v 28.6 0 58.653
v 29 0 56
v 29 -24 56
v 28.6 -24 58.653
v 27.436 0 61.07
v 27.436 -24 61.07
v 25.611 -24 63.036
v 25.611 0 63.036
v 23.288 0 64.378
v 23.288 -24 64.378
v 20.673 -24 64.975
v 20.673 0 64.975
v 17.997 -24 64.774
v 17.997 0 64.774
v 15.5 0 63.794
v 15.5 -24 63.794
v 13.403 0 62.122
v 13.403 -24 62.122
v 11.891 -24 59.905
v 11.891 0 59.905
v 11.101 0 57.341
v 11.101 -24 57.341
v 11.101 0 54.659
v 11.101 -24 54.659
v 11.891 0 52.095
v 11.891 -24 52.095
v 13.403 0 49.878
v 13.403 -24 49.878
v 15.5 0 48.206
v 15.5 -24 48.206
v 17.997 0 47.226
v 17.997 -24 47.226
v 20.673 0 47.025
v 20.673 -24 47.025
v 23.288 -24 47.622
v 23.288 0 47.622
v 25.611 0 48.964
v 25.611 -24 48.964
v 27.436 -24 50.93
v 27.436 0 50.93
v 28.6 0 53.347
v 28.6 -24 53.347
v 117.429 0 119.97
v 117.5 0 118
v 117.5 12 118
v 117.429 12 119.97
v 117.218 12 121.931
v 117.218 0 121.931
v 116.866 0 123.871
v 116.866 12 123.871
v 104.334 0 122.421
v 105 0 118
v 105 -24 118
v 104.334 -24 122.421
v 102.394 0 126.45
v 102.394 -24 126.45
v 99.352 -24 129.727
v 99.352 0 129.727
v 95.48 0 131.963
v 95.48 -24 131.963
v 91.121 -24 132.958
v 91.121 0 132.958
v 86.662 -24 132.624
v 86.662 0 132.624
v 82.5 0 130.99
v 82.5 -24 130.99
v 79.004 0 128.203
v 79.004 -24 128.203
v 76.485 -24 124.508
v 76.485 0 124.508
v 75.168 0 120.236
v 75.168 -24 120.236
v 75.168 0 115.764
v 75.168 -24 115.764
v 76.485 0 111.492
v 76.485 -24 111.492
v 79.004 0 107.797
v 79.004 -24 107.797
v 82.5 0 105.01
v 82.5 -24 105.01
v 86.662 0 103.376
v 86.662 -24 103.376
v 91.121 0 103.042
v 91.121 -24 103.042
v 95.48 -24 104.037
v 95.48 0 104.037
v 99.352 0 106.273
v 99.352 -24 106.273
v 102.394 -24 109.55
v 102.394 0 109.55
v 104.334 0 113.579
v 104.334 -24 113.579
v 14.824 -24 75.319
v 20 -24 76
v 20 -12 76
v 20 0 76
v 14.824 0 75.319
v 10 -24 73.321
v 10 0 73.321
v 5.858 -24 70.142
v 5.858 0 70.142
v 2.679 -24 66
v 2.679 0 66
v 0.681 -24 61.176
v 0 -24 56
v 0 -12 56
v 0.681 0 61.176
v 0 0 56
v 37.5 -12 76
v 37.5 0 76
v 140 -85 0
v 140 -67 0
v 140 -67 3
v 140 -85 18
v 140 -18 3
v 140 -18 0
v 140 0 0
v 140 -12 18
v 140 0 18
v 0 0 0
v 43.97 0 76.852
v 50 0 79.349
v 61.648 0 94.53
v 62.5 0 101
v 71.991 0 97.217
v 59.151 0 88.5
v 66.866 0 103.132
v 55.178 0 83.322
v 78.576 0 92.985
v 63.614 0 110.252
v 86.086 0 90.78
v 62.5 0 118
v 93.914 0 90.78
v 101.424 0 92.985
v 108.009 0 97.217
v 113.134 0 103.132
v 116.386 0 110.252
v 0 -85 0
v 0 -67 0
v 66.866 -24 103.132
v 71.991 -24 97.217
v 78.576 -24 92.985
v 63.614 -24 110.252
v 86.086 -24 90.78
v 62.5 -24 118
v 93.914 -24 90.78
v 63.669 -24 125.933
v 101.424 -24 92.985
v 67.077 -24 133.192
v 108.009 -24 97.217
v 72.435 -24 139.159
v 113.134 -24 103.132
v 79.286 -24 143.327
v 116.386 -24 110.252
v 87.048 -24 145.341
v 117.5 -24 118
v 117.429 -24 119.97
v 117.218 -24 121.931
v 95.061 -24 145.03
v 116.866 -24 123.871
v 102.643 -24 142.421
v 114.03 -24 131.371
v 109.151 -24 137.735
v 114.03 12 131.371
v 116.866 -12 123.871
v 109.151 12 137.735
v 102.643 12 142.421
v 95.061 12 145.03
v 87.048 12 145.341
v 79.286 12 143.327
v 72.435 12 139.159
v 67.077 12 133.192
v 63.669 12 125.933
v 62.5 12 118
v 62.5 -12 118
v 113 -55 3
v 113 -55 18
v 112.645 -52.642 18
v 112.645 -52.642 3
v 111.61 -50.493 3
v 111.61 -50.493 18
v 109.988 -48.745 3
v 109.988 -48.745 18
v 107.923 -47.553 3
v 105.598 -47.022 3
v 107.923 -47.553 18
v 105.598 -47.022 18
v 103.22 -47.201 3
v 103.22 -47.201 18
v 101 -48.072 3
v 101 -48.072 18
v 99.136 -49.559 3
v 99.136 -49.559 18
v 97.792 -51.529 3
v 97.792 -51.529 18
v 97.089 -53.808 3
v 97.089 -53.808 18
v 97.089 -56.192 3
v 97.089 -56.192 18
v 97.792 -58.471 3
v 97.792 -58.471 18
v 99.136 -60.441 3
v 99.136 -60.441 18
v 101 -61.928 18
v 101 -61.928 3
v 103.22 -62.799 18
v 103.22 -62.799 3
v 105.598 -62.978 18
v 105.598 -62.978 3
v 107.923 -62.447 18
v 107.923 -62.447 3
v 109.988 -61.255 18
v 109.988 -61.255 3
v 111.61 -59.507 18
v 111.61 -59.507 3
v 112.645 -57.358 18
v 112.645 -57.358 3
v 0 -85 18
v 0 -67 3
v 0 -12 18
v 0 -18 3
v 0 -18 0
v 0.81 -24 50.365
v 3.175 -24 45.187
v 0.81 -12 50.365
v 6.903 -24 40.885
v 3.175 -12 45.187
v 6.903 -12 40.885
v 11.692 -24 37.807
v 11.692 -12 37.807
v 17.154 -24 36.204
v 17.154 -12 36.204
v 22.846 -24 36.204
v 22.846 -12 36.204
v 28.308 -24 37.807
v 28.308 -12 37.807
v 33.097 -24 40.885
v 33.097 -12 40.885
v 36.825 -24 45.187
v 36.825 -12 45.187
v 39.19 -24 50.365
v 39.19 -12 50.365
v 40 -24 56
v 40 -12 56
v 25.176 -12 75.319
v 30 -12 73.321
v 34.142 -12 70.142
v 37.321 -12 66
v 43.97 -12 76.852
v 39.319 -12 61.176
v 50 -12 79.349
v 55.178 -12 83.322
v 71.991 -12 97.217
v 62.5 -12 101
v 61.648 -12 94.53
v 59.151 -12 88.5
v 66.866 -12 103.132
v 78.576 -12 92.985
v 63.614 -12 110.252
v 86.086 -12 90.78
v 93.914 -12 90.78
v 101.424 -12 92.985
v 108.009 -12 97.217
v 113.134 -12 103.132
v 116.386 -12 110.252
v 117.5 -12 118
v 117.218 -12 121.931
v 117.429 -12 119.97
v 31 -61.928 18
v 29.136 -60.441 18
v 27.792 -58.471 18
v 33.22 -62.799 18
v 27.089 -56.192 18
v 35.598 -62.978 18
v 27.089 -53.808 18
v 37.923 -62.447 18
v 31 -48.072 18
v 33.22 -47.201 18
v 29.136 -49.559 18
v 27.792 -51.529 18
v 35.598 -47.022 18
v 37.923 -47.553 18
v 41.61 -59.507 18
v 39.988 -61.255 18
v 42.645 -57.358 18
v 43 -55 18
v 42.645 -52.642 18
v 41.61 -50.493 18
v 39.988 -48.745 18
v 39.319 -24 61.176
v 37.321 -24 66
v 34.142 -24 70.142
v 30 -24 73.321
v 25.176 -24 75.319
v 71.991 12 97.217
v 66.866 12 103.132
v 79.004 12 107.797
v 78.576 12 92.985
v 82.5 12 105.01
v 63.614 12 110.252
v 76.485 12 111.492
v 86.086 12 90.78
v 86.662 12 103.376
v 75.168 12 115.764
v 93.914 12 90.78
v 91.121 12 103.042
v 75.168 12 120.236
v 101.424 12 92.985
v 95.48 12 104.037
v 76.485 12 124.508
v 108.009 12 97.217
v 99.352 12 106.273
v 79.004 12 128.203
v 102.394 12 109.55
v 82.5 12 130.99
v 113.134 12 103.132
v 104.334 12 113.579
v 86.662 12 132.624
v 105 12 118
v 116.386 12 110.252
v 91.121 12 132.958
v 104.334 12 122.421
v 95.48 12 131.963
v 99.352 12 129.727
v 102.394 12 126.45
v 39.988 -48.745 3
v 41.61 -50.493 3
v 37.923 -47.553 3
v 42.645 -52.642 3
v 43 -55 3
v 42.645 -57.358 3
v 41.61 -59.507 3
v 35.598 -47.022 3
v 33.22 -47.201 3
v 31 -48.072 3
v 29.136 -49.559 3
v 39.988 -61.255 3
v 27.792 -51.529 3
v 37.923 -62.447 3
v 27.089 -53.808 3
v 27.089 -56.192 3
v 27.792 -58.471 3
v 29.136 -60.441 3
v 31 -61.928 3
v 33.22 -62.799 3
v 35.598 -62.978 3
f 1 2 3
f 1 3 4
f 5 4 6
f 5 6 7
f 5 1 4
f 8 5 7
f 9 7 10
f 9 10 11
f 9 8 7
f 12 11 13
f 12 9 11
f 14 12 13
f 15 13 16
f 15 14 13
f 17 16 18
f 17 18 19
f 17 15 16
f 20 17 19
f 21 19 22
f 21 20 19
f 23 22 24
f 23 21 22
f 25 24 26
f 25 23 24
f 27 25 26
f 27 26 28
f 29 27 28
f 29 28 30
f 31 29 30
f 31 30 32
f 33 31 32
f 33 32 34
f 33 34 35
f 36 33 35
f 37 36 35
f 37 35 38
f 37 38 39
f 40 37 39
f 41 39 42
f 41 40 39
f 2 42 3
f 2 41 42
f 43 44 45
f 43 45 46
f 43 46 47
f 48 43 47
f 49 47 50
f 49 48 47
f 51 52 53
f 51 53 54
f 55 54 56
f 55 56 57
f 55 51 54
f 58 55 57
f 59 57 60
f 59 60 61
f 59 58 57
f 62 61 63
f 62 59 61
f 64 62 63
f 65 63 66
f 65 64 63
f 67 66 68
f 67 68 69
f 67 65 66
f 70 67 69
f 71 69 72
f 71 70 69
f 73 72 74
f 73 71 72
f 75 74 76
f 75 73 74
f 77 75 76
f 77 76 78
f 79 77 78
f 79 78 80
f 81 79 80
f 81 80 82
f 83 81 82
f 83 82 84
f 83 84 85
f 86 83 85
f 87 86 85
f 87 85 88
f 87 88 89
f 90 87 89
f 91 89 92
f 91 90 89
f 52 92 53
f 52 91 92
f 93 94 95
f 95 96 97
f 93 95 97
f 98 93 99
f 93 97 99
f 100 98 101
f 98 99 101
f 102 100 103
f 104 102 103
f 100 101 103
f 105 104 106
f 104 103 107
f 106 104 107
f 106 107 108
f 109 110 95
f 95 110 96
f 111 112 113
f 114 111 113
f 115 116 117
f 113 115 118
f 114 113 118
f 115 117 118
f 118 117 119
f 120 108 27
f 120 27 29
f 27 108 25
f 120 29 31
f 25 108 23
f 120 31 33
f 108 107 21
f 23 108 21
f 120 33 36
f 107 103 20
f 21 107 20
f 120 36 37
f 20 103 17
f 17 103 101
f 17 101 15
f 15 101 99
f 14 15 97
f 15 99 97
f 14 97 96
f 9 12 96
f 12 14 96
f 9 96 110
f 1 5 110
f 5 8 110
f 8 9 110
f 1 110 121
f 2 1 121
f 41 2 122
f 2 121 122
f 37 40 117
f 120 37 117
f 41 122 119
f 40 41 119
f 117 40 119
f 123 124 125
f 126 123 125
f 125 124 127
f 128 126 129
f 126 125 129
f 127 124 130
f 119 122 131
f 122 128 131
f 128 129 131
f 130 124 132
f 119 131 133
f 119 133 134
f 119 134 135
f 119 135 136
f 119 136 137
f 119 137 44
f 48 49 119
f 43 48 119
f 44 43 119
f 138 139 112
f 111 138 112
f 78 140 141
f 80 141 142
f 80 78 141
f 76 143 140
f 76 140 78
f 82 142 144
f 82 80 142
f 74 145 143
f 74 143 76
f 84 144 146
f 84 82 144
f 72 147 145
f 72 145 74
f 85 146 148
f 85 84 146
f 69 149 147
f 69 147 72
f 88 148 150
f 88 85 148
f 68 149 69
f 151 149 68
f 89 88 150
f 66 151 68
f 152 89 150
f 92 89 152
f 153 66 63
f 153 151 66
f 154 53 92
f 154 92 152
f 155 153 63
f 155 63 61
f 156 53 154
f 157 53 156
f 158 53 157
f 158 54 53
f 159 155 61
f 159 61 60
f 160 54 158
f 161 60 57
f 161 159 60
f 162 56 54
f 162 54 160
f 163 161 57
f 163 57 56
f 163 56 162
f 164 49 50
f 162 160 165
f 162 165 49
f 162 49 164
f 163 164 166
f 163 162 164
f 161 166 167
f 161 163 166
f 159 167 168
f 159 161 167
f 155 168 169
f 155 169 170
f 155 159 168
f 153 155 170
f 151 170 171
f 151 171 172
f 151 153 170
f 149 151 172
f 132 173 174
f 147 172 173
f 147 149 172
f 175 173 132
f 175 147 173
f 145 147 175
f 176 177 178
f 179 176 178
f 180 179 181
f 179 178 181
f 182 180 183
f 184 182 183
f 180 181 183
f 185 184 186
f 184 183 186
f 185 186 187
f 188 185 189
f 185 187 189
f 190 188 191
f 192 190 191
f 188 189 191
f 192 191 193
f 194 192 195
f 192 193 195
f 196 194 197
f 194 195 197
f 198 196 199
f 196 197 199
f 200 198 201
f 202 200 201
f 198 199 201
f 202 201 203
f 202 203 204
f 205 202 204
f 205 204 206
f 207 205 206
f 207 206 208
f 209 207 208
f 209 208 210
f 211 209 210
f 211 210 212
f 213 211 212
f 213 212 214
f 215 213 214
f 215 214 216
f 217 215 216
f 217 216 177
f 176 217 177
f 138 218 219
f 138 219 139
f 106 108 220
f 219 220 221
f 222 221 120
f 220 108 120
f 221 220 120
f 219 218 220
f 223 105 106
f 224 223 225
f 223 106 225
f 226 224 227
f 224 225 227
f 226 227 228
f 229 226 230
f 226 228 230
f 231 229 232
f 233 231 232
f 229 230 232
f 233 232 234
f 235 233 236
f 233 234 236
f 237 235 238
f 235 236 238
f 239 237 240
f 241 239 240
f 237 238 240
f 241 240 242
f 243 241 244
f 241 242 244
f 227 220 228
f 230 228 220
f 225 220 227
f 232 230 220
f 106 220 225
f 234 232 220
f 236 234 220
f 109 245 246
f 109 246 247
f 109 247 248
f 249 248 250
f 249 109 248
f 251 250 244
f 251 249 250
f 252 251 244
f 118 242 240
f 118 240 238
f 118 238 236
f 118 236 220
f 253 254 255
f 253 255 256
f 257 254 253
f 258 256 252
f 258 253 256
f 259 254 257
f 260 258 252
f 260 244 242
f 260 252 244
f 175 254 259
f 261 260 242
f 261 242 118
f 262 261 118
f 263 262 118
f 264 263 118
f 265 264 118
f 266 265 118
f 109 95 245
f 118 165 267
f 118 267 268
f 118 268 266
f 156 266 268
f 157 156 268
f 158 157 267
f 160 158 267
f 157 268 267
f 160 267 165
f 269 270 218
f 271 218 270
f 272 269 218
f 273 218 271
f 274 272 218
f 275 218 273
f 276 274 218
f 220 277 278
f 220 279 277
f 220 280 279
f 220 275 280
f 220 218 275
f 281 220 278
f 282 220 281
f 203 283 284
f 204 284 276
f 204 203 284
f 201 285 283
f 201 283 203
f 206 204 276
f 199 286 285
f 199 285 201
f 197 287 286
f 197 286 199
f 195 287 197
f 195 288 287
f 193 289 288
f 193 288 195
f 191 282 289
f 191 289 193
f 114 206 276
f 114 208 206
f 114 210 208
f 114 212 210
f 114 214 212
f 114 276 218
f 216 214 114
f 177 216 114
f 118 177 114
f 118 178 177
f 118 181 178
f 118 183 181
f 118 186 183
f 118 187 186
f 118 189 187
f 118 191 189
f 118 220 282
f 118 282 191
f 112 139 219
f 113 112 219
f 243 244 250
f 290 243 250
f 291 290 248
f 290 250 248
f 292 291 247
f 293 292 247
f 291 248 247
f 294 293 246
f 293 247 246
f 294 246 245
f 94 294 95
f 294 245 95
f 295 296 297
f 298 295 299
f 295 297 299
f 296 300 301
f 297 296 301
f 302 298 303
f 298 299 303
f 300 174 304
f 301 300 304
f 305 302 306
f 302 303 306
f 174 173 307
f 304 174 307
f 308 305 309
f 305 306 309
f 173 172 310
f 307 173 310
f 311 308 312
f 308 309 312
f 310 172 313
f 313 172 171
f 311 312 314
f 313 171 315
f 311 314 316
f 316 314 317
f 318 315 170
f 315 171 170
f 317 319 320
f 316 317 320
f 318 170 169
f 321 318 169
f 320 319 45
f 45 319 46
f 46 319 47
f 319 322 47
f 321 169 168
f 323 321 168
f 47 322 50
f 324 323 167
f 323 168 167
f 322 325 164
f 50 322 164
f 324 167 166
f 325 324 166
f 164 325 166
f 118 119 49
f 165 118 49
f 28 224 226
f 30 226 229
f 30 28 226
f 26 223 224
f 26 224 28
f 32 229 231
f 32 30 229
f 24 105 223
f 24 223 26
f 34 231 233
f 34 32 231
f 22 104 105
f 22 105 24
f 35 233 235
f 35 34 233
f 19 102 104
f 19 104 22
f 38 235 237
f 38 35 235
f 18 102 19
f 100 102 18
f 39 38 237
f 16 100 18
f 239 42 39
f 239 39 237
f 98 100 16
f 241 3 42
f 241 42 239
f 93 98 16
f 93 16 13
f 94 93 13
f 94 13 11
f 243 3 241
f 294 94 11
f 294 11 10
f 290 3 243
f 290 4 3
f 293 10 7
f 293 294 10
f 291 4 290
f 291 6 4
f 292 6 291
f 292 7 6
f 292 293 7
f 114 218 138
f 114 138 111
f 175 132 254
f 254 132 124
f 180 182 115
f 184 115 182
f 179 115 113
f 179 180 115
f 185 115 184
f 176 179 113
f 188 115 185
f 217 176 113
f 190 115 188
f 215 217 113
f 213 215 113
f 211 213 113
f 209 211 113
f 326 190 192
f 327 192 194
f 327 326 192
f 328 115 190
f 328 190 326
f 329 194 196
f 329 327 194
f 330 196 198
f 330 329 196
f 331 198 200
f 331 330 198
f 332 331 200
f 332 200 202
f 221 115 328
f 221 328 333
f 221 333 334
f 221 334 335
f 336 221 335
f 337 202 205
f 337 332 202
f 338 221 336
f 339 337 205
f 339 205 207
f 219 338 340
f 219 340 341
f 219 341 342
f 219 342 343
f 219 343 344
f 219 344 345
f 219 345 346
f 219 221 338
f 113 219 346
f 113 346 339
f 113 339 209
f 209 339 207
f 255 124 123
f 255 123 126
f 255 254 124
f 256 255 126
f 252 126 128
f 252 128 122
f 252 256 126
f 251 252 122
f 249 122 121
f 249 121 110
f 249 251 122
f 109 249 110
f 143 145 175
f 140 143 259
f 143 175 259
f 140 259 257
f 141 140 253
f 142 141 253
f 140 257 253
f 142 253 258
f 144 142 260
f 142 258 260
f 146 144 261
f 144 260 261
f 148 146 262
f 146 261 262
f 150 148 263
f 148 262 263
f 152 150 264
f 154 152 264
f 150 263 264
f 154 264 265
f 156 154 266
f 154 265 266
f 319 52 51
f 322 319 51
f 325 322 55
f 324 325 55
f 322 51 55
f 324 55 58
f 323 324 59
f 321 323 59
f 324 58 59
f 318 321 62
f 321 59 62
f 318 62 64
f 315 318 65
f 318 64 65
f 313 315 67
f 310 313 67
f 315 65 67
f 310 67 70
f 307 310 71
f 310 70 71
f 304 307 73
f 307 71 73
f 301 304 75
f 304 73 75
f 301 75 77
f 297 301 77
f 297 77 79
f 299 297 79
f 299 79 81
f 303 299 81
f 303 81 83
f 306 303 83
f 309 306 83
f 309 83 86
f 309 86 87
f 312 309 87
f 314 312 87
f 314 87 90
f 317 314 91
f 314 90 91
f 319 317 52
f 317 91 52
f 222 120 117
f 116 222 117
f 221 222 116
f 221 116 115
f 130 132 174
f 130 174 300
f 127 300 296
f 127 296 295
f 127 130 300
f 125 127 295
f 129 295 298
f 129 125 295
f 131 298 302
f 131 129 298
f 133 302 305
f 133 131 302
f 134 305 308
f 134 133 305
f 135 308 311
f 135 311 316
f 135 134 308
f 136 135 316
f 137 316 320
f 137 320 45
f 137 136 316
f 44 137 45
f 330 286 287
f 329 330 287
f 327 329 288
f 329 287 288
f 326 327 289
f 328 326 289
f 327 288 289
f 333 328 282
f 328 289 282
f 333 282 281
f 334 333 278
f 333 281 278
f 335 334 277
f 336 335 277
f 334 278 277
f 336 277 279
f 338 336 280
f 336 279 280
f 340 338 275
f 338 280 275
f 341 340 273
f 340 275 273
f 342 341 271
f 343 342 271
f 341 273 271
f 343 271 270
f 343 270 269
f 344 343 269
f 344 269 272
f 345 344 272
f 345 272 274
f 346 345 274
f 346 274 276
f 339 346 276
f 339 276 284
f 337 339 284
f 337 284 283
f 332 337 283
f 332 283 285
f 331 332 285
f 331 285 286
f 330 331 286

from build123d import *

# Parameters (mm, degrees)
F0_W      = 140
F0_H      = 18
F1_DEPTH  = 12
F2_R      = 25
F0_R      = 9
F3_DEPTH  = 24
F0_R_2    = 15
F4_DEPTH  = 24
F5_DEPTH  = 12
F6_DEPTH  = 85
F7_W      = 49
F7_H      = 3
F8_DEPTH  = 140.001
F9_R      = 8
F10_DEPTH = 18.001


with BuildPart() as f1:
    # F0 (on Front) → F1 (new body)
    with BuildSketch(Plane.XZ):
        with BuildLine():
            ThreePointArc((20, 76), (34.142136, 70.142136), (40, 56))
            ThreePointArc((40, 56), (20, 36), (0, 56))
            Line((0, 56), (0, 18))
            Line((0, 18), (140, 18))
            Line((140, 18), (116.866088, 123.870544))
            ThreePointArc((116.866088, 123.870544), (117.341063, 120.952335), (117.5, 118))
            ThreePointArc((117.5, 118), (90, 90.5), (62.5, 118))
            Line((62.5, 118), (62.5, 76))
            Line((62.5, 76), (20, 76))
        make_face()
        with Locations((70, 9)):
            Rectangle(F0_W, F0_H)
    extrude(amount=F1_DEPTH)

    # F2
    f2_edges = [f1.edges().sort_by_distance(p)[0] for p in [
        (62.5, -6, 76),
    ]]
    fillet(f2_edges, radius=F2_R)

    # F0 (on Front) → F3 (join)
    with BuildSketch(Plane.XZ):
        with BuildLine():
            ThreePointArc((0, 56), (20, 36), (40, 56))
            ThreePointArc((40, 56), (34.142136, 70.142136), (20, 76))
            ThreePointArc((20, 76), (5.857864, 70.142136), (0, 56))
        make_face()
        with Locations((20, 56)):
            Circle(F0_R, mode=Mode.SUBTRACT)
    extrude(amount=F3_DEPTH)

    # F0 (on Front) → F4 (join)
    with BuildSketch(Plane.XZ):
        with BuildLine():
            ThreePointArc((116.866088, 123.870544), (87.047665, 145.341063), (62.5, 118))
            ThreePointArc((62.5, 118), (90, 90.5), (117.5, 118))
            ThreePointArc((117.5, 118), (117.341063, 120.952335), (116.866088, 123.870544))
        make_face()
        with Locations((90, 118)):
            Circle(F0_R_2, mode=Mode.SUBTRACT)
    extrude(amount=F4_DEPTH)

    # F0 (on Front) → F5 (join)
    with BuildSketch(Plane.XZ):
        with BuildLine():
            ThreePointArc((116.866088, 123.870544), (87.047665, 145.341063), (62.5, 118))
            ThreePointArc((62.5, 118), (90, 90.5), (117.5, 118))
            ThreePointArc((117.5, 118), (117.341063, 120.952335), (116.866088, 123.870544))
        make_face()
        with Locations((90, 118)):
            Circle(F0_R_2, mode=Mode.SUBTRACT)
    extrude(amount=-F5_DEPTH)

    # F0 (on Front) → F6 (join)
    with BuildSketch(Plane.XZ):
        with Locations((70, 9)):
            Rectangle(F0_W, F0_H)
    extrude(amount=F6_DEPTH)

    # F7 (on face) → F8 (cut, through all)
    with BuildSketch(Plane(origin=(0, 0, 0), x_dir=(0, -1, 0), z_dir=(-1, 0, 0))):
        with Locations((42.5, 1.5)):
            Rectangle(F7_W, F7_H)
    extrude(amount=-F8_DEPTH, mode=Mode.SUBTRACT)

    # F9 (on face) → F10 (cut, through all)
    with BuildSketch(Plane.XY.offset(18)):
        with Locations((35, -55)):
            Circle(F9_R)
        with Locations((105, -55)):
            Circle(F9_R)
    extrude(amount=-F10_DEPTH, mode=Mode.SUBTRACT)


solid = f1.part
